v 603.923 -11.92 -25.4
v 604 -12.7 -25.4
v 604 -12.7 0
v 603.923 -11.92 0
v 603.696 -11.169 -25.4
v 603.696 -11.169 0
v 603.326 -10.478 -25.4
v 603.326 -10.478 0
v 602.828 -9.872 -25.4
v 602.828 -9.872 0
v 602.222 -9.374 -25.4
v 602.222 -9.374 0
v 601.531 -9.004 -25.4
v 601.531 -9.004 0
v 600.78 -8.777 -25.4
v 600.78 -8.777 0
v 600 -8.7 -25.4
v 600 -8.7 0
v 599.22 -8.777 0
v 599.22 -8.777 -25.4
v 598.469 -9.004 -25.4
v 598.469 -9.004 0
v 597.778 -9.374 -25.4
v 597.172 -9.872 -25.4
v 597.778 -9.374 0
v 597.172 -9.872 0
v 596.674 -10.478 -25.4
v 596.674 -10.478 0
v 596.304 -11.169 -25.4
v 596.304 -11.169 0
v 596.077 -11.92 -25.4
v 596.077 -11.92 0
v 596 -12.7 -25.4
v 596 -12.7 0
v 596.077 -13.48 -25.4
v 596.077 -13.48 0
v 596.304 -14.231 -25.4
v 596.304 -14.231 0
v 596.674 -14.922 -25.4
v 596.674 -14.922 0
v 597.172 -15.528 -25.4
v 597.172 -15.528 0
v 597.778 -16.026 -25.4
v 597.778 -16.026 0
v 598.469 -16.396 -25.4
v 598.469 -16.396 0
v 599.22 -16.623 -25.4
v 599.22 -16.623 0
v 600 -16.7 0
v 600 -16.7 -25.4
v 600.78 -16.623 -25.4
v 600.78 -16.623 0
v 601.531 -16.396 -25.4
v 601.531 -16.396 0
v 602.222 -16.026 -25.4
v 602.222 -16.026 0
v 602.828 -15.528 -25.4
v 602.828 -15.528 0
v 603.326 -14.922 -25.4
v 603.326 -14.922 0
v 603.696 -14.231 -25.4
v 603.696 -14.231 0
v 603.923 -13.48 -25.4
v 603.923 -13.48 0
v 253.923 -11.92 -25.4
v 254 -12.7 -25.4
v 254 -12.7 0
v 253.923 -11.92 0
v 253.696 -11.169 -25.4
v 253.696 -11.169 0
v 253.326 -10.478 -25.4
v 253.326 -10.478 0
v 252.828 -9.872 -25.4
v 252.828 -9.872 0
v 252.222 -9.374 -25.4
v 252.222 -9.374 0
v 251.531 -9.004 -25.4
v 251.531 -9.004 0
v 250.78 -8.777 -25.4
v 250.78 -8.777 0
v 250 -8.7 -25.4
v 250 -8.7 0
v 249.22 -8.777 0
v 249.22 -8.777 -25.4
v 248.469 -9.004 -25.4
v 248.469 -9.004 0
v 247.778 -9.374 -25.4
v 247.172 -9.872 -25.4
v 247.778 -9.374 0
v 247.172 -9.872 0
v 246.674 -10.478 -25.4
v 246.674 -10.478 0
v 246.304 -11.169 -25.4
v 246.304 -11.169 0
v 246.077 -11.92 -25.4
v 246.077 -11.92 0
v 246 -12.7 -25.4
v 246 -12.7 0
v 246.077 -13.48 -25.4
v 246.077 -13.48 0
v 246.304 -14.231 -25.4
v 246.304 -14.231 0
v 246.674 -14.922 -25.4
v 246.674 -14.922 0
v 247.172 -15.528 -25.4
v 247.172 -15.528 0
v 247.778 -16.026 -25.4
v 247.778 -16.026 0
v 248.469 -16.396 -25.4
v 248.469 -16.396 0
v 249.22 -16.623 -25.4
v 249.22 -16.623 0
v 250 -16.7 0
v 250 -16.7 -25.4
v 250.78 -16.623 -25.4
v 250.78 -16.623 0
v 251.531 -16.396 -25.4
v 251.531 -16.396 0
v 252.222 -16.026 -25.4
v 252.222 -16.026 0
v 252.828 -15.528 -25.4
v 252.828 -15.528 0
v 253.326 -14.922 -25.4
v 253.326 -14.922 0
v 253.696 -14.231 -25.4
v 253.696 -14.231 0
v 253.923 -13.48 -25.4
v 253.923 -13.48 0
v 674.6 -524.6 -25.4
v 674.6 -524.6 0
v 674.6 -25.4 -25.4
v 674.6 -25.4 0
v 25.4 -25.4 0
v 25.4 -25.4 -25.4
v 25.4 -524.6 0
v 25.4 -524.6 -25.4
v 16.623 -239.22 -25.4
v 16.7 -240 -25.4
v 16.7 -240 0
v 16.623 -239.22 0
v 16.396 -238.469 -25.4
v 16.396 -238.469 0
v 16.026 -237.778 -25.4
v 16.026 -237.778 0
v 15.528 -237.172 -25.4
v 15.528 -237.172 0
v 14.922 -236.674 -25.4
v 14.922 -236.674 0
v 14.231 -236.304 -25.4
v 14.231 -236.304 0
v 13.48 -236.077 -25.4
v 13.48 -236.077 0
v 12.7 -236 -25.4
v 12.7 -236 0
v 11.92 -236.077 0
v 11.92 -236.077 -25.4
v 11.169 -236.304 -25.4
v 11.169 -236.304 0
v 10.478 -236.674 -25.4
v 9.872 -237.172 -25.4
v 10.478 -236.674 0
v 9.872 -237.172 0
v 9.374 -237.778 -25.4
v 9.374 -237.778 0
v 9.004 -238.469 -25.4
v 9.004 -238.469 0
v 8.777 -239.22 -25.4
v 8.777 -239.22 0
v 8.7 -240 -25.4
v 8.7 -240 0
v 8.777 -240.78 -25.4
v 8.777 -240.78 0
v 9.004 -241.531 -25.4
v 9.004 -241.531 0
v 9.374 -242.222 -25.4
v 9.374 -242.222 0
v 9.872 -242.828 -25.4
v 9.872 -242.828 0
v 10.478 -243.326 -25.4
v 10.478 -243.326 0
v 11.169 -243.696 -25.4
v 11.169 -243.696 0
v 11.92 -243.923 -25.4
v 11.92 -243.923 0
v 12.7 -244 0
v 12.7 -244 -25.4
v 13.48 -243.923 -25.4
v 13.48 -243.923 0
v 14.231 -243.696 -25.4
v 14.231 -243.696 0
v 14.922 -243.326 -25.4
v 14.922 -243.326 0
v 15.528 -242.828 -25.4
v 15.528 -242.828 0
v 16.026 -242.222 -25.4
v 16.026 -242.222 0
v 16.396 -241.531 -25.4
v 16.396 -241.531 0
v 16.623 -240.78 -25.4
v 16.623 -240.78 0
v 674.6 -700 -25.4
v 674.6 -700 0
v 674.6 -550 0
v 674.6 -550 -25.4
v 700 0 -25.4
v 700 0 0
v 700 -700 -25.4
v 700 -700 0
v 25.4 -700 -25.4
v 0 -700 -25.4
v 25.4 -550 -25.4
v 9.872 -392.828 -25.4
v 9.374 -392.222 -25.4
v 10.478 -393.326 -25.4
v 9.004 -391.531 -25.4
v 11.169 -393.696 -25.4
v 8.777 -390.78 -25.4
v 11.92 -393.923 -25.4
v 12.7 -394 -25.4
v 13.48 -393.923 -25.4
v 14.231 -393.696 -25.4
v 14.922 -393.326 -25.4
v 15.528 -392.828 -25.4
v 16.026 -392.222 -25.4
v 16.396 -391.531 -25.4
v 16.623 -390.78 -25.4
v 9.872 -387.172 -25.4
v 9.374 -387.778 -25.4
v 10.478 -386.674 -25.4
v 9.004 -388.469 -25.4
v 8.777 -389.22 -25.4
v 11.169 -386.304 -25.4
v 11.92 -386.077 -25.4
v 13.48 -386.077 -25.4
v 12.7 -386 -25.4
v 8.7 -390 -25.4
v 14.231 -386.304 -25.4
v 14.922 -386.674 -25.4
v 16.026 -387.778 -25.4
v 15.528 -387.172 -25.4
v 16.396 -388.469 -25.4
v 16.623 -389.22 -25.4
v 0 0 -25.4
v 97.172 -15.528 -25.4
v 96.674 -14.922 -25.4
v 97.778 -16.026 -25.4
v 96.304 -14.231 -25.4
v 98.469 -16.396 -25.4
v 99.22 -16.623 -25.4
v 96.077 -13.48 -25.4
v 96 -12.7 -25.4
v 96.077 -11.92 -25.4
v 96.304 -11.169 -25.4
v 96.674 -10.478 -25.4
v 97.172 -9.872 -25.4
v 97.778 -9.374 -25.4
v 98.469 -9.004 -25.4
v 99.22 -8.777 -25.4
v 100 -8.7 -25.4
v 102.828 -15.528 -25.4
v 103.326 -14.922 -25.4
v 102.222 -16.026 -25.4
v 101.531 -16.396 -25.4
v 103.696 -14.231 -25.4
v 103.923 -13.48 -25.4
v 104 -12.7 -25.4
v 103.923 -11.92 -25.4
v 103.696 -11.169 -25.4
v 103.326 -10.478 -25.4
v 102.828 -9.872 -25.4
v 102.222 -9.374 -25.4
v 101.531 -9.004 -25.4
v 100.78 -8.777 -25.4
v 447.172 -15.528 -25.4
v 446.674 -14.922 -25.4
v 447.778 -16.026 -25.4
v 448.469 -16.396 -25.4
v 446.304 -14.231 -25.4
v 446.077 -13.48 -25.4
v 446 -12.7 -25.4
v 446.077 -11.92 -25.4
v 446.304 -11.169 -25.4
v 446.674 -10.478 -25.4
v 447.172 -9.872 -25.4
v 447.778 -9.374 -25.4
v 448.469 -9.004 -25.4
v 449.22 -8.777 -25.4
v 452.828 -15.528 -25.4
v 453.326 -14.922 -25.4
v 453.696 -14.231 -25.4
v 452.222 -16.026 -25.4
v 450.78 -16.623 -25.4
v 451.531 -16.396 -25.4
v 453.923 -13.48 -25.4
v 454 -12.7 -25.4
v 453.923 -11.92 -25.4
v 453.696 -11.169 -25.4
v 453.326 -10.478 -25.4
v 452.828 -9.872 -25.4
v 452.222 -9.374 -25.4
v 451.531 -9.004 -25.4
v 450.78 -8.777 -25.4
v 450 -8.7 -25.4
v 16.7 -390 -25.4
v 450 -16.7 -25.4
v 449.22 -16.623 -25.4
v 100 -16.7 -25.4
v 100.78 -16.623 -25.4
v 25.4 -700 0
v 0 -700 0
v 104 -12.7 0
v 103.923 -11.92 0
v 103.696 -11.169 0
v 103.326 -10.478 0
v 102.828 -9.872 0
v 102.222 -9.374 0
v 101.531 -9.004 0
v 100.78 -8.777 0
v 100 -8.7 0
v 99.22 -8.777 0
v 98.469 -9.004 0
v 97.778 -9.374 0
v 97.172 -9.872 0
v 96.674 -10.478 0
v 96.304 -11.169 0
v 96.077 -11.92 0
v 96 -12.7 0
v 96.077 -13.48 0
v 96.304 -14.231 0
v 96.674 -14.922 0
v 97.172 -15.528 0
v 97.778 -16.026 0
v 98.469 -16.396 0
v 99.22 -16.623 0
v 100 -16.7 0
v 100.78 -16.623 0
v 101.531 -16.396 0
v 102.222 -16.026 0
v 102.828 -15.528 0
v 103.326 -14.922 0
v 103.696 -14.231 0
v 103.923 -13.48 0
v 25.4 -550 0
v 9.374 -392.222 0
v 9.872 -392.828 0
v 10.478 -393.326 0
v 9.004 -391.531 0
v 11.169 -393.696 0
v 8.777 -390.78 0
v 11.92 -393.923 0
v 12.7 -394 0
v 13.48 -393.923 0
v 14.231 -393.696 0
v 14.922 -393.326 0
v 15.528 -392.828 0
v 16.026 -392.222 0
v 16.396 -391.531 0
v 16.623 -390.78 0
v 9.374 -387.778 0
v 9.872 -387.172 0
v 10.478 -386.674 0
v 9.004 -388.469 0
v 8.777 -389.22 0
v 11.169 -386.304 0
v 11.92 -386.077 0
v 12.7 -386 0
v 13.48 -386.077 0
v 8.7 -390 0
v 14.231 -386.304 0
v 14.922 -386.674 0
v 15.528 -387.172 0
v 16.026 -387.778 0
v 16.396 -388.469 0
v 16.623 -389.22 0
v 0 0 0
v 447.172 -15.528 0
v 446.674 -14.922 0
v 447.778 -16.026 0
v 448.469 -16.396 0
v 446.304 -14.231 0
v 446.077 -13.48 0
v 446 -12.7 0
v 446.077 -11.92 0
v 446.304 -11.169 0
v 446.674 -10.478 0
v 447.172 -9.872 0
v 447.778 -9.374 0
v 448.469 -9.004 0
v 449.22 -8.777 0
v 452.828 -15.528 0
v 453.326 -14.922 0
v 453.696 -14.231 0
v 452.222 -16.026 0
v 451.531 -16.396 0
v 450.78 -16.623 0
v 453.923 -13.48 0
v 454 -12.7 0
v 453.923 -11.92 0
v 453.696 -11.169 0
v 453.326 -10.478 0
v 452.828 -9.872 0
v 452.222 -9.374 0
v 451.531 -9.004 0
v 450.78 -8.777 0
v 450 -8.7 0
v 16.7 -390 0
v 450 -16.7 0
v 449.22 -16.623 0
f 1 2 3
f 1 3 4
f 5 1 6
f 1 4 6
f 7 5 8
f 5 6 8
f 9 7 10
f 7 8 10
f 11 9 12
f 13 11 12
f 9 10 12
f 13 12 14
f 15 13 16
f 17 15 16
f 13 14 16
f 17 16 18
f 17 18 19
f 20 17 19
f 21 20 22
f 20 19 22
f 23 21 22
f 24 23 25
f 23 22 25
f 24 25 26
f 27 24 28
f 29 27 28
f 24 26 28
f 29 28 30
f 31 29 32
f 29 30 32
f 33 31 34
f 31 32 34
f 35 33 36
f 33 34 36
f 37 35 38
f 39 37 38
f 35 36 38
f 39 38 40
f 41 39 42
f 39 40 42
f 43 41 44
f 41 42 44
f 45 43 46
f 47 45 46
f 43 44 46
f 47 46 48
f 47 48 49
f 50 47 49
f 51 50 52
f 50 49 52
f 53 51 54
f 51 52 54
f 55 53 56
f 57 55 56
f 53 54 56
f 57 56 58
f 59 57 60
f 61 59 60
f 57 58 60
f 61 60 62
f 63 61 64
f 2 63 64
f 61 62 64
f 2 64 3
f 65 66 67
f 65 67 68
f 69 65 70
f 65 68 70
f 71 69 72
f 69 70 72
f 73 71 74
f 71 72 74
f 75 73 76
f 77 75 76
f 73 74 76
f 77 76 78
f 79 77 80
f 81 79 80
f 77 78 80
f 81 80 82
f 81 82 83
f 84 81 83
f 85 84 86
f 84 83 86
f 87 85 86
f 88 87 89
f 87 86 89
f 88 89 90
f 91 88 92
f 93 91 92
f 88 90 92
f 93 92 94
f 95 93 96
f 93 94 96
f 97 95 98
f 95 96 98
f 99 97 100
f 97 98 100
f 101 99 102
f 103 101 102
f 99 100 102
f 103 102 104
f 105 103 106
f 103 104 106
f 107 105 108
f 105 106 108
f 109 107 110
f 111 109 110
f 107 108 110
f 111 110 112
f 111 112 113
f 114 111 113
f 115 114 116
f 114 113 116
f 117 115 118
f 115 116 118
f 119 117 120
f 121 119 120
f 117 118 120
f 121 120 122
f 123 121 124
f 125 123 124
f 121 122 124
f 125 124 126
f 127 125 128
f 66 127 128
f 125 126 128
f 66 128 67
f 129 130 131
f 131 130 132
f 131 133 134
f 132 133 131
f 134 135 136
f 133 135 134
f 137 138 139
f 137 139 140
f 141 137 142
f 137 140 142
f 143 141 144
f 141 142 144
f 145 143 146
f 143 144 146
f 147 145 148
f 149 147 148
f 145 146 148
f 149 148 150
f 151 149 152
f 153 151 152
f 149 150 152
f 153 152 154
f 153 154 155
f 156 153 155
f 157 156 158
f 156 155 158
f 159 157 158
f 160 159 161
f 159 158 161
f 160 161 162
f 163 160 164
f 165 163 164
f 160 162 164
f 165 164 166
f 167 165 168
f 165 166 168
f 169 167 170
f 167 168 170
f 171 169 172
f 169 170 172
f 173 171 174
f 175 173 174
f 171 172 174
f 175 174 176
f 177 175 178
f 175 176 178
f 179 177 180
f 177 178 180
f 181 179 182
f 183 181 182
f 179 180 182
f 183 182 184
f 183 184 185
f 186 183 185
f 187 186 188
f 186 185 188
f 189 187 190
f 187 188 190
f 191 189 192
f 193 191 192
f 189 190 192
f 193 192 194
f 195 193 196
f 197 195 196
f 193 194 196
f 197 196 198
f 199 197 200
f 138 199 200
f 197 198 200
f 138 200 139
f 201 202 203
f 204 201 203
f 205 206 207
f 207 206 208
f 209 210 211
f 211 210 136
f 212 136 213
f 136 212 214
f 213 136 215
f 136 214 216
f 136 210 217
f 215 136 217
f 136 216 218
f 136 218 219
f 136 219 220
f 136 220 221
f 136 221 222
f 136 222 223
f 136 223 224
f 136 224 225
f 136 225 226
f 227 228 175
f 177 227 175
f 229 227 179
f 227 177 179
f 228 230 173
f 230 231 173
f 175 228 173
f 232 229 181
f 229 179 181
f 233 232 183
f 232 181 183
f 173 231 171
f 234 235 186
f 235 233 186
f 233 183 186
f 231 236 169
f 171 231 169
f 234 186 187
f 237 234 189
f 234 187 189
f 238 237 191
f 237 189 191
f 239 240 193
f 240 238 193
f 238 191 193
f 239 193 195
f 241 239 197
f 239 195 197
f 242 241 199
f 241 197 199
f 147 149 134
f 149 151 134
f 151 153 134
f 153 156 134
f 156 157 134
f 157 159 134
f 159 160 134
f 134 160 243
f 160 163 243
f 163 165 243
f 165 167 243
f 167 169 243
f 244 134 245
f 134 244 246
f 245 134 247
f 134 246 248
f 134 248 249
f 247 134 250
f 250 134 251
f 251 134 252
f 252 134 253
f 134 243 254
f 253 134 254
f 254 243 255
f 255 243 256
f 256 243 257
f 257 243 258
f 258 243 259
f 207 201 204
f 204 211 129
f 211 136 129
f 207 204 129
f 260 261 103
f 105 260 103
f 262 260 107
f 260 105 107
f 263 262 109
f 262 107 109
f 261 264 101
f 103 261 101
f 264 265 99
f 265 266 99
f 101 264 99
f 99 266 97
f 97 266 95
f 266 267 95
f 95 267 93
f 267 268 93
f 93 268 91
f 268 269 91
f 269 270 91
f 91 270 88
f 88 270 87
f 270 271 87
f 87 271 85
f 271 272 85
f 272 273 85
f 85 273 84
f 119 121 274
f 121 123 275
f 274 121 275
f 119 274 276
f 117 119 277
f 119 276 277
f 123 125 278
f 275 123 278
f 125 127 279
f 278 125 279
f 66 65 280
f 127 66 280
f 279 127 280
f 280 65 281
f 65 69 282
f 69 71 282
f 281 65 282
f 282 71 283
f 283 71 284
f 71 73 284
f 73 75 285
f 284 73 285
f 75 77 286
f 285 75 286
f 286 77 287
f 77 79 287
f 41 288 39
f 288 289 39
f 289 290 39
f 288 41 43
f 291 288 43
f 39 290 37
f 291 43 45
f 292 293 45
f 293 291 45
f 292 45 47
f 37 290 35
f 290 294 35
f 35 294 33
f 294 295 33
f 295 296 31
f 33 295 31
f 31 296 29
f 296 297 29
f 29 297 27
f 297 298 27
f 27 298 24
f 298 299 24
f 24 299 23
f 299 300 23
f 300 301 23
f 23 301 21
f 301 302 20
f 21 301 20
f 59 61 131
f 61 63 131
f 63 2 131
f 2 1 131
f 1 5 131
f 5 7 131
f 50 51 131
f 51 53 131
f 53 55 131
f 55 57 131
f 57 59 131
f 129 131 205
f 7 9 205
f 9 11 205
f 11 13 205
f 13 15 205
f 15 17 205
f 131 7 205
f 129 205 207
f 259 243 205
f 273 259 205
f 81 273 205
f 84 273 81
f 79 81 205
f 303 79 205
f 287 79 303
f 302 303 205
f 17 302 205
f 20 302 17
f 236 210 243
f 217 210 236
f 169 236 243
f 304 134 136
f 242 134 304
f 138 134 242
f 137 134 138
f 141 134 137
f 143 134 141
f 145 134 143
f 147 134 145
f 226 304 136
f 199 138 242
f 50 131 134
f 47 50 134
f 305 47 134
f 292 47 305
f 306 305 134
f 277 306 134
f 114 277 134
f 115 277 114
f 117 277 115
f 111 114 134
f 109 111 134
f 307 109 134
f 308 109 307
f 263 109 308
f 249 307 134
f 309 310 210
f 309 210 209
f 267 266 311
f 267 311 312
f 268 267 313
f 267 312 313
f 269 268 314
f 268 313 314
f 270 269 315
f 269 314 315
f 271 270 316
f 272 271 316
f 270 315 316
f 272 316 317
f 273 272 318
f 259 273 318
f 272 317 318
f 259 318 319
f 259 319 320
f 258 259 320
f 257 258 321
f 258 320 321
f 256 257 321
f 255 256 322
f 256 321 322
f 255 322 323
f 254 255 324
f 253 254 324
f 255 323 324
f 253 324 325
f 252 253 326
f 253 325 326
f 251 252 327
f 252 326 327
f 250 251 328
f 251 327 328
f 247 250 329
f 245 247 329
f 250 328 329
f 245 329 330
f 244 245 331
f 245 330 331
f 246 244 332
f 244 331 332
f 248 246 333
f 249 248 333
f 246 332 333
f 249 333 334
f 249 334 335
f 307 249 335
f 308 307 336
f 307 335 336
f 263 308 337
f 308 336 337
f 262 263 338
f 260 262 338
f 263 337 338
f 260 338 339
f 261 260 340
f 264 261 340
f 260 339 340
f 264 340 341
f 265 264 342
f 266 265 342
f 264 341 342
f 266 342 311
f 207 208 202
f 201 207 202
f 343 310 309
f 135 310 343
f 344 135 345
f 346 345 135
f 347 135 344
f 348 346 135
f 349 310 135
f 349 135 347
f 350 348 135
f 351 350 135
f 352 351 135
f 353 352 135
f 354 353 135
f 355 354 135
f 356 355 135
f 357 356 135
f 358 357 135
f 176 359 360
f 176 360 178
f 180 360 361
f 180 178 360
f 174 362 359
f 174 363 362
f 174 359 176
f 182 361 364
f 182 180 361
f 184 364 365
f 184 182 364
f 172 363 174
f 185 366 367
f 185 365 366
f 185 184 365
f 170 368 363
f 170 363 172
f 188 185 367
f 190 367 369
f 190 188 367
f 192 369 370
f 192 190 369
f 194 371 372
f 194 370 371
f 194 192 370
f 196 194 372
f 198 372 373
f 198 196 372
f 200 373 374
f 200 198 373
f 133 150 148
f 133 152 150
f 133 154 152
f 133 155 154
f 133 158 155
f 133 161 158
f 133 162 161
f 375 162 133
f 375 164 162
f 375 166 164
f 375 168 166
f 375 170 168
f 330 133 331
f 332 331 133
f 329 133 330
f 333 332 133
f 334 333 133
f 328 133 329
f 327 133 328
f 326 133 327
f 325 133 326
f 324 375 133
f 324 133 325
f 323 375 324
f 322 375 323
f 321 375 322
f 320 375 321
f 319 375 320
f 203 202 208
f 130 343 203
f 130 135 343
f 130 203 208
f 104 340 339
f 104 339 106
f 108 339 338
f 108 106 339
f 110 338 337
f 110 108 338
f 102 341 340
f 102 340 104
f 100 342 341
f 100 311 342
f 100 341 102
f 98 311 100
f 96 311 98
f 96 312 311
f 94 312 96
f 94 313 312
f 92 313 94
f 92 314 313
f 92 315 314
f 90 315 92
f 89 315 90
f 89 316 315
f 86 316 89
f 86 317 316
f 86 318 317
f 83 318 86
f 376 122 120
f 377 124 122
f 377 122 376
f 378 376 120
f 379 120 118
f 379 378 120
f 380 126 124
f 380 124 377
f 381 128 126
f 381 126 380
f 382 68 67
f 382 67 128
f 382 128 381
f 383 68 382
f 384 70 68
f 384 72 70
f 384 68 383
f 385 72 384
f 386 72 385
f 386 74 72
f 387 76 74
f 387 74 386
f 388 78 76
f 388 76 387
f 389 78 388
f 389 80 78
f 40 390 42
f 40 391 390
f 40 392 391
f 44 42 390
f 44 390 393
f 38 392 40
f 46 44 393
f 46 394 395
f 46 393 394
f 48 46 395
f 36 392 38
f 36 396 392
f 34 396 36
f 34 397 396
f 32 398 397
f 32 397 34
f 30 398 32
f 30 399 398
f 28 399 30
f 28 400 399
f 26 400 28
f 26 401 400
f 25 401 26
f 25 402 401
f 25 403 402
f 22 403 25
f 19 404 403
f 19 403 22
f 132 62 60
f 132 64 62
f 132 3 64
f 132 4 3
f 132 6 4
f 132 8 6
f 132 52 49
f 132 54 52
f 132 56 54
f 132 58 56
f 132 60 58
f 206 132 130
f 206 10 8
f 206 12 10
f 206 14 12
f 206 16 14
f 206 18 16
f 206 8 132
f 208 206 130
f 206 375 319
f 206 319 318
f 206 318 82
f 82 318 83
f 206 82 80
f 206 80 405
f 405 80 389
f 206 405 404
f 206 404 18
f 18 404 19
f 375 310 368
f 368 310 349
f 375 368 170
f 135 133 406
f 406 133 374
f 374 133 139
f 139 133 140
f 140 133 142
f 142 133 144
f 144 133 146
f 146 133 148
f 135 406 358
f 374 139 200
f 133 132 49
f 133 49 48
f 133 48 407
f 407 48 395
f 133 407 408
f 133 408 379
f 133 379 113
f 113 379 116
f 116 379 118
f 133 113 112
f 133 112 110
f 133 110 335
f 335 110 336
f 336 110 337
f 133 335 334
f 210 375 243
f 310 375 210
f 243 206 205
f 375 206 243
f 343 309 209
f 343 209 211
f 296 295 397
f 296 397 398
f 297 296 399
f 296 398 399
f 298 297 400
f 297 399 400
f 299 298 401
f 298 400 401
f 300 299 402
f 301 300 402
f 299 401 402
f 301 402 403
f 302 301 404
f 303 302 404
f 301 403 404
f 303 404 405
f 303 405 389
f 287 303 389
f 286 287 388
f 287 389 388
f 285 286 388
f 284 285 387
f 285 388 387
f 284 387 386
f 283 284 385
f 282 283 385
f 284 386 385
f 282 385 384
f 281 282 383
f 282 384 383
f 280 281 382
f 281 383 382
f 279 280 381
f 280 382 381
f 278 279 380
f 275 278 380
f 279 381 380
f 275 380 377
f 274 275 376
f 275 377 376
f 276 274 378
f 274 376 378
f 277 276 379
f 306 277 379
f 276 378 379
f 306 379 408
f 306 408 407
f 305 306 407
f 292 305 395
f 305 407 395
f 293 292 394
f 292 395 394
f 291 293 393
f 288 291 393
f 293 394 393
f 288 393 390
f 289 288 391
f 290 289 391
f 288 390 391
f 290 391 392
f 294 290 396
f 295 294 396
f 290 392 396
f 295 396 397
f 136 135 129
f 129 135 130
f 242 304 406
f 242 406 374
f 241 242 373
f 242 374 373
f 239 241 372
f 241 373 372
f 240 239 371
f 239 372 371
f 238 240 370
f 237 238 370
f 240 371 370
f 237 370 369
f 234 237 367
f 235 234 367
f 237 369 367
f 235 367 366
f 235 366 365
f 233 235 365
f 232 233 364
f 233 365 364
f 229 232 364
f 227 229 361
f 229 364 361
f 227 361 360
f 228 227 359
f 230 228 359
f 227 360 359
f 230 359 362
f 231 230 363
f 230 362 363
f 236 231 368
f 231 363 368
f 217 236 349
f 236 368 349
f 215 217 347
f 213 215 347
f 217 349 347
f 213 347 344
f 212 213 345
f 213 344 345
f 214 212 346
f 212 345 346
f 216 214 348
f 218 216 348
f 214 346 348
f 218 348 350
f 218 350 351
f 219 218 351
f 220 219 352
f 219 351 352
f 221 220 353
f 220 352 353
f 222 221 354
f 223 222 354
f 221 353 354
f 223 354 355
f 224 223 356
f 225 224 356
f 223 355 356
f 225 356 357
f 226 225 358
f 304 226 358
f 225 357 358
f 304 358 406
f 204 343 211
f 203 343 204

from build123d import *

# Parameters (mm, degrees)
SKETCH1_W           = 649.2
SKETCH1_H           = 25.4
BOSS_EXTRUDE3_DEPTH = 25.4
SKETCH15_R          = 4
CUT_EXTRUDE5_DEPTH  = 25.4
SKETCH11_R          = 4
CUT_EXTRUDE7_DEPTH  = 25.4


with BuildPart() as part:
    # Sketch1 → Boss-Extrude3 (new body)
    with BuildSketch(Plane.XY):
        Polygon((25.4, -700), (25.4, -25.4), (0, 0), (0, -700), align=None)
        Polygon((25.4, -25.4), (674.6, -25.4), (700, 0), (0, 0), align=None)
        Polygon((674.6, -25.4), (700, 0), (700, -700), (674.6, -700), align=None)
        with Locations((350, -537.3)):
            Rectangle(SKETCH1_W, SKETCH1_H)
    extrude(amount=-BOSS_EXTRUDE3_DEPTH)

    # Sketch15 → Cut-Extrude5 (cut)
    with BuildSketch(Plane.XY):
        with Locations((12.7, -240)):
            Circle(SKETCH15_R)
        with Locations((12.7, -390)):
            Circle(SKETCH15_R)
    extrude(amount=-CUT_EXTRUDE5_DEPTH, mode=Mode.SUBTRACT)

    # Sketch11 → Cut-Extrude7 (cut)
    with BuildSketch(Plane.XY):
        with Locations((100, -12.7)):
            Circle(SKETCH11_R)
        with Locations((250, -12.7)):
            Circle(SKETCH11_R)
        with Locations((600, -12.7)):
            Circle(SKETCH11_R)
        with Locations((450, -12.7)):
            Circle(SKETCH11_R)
    extrude(amount=-CUT_EXTRUDE7_DEPTH, mode=Mode.SUBTRACT)


solid = part.part
